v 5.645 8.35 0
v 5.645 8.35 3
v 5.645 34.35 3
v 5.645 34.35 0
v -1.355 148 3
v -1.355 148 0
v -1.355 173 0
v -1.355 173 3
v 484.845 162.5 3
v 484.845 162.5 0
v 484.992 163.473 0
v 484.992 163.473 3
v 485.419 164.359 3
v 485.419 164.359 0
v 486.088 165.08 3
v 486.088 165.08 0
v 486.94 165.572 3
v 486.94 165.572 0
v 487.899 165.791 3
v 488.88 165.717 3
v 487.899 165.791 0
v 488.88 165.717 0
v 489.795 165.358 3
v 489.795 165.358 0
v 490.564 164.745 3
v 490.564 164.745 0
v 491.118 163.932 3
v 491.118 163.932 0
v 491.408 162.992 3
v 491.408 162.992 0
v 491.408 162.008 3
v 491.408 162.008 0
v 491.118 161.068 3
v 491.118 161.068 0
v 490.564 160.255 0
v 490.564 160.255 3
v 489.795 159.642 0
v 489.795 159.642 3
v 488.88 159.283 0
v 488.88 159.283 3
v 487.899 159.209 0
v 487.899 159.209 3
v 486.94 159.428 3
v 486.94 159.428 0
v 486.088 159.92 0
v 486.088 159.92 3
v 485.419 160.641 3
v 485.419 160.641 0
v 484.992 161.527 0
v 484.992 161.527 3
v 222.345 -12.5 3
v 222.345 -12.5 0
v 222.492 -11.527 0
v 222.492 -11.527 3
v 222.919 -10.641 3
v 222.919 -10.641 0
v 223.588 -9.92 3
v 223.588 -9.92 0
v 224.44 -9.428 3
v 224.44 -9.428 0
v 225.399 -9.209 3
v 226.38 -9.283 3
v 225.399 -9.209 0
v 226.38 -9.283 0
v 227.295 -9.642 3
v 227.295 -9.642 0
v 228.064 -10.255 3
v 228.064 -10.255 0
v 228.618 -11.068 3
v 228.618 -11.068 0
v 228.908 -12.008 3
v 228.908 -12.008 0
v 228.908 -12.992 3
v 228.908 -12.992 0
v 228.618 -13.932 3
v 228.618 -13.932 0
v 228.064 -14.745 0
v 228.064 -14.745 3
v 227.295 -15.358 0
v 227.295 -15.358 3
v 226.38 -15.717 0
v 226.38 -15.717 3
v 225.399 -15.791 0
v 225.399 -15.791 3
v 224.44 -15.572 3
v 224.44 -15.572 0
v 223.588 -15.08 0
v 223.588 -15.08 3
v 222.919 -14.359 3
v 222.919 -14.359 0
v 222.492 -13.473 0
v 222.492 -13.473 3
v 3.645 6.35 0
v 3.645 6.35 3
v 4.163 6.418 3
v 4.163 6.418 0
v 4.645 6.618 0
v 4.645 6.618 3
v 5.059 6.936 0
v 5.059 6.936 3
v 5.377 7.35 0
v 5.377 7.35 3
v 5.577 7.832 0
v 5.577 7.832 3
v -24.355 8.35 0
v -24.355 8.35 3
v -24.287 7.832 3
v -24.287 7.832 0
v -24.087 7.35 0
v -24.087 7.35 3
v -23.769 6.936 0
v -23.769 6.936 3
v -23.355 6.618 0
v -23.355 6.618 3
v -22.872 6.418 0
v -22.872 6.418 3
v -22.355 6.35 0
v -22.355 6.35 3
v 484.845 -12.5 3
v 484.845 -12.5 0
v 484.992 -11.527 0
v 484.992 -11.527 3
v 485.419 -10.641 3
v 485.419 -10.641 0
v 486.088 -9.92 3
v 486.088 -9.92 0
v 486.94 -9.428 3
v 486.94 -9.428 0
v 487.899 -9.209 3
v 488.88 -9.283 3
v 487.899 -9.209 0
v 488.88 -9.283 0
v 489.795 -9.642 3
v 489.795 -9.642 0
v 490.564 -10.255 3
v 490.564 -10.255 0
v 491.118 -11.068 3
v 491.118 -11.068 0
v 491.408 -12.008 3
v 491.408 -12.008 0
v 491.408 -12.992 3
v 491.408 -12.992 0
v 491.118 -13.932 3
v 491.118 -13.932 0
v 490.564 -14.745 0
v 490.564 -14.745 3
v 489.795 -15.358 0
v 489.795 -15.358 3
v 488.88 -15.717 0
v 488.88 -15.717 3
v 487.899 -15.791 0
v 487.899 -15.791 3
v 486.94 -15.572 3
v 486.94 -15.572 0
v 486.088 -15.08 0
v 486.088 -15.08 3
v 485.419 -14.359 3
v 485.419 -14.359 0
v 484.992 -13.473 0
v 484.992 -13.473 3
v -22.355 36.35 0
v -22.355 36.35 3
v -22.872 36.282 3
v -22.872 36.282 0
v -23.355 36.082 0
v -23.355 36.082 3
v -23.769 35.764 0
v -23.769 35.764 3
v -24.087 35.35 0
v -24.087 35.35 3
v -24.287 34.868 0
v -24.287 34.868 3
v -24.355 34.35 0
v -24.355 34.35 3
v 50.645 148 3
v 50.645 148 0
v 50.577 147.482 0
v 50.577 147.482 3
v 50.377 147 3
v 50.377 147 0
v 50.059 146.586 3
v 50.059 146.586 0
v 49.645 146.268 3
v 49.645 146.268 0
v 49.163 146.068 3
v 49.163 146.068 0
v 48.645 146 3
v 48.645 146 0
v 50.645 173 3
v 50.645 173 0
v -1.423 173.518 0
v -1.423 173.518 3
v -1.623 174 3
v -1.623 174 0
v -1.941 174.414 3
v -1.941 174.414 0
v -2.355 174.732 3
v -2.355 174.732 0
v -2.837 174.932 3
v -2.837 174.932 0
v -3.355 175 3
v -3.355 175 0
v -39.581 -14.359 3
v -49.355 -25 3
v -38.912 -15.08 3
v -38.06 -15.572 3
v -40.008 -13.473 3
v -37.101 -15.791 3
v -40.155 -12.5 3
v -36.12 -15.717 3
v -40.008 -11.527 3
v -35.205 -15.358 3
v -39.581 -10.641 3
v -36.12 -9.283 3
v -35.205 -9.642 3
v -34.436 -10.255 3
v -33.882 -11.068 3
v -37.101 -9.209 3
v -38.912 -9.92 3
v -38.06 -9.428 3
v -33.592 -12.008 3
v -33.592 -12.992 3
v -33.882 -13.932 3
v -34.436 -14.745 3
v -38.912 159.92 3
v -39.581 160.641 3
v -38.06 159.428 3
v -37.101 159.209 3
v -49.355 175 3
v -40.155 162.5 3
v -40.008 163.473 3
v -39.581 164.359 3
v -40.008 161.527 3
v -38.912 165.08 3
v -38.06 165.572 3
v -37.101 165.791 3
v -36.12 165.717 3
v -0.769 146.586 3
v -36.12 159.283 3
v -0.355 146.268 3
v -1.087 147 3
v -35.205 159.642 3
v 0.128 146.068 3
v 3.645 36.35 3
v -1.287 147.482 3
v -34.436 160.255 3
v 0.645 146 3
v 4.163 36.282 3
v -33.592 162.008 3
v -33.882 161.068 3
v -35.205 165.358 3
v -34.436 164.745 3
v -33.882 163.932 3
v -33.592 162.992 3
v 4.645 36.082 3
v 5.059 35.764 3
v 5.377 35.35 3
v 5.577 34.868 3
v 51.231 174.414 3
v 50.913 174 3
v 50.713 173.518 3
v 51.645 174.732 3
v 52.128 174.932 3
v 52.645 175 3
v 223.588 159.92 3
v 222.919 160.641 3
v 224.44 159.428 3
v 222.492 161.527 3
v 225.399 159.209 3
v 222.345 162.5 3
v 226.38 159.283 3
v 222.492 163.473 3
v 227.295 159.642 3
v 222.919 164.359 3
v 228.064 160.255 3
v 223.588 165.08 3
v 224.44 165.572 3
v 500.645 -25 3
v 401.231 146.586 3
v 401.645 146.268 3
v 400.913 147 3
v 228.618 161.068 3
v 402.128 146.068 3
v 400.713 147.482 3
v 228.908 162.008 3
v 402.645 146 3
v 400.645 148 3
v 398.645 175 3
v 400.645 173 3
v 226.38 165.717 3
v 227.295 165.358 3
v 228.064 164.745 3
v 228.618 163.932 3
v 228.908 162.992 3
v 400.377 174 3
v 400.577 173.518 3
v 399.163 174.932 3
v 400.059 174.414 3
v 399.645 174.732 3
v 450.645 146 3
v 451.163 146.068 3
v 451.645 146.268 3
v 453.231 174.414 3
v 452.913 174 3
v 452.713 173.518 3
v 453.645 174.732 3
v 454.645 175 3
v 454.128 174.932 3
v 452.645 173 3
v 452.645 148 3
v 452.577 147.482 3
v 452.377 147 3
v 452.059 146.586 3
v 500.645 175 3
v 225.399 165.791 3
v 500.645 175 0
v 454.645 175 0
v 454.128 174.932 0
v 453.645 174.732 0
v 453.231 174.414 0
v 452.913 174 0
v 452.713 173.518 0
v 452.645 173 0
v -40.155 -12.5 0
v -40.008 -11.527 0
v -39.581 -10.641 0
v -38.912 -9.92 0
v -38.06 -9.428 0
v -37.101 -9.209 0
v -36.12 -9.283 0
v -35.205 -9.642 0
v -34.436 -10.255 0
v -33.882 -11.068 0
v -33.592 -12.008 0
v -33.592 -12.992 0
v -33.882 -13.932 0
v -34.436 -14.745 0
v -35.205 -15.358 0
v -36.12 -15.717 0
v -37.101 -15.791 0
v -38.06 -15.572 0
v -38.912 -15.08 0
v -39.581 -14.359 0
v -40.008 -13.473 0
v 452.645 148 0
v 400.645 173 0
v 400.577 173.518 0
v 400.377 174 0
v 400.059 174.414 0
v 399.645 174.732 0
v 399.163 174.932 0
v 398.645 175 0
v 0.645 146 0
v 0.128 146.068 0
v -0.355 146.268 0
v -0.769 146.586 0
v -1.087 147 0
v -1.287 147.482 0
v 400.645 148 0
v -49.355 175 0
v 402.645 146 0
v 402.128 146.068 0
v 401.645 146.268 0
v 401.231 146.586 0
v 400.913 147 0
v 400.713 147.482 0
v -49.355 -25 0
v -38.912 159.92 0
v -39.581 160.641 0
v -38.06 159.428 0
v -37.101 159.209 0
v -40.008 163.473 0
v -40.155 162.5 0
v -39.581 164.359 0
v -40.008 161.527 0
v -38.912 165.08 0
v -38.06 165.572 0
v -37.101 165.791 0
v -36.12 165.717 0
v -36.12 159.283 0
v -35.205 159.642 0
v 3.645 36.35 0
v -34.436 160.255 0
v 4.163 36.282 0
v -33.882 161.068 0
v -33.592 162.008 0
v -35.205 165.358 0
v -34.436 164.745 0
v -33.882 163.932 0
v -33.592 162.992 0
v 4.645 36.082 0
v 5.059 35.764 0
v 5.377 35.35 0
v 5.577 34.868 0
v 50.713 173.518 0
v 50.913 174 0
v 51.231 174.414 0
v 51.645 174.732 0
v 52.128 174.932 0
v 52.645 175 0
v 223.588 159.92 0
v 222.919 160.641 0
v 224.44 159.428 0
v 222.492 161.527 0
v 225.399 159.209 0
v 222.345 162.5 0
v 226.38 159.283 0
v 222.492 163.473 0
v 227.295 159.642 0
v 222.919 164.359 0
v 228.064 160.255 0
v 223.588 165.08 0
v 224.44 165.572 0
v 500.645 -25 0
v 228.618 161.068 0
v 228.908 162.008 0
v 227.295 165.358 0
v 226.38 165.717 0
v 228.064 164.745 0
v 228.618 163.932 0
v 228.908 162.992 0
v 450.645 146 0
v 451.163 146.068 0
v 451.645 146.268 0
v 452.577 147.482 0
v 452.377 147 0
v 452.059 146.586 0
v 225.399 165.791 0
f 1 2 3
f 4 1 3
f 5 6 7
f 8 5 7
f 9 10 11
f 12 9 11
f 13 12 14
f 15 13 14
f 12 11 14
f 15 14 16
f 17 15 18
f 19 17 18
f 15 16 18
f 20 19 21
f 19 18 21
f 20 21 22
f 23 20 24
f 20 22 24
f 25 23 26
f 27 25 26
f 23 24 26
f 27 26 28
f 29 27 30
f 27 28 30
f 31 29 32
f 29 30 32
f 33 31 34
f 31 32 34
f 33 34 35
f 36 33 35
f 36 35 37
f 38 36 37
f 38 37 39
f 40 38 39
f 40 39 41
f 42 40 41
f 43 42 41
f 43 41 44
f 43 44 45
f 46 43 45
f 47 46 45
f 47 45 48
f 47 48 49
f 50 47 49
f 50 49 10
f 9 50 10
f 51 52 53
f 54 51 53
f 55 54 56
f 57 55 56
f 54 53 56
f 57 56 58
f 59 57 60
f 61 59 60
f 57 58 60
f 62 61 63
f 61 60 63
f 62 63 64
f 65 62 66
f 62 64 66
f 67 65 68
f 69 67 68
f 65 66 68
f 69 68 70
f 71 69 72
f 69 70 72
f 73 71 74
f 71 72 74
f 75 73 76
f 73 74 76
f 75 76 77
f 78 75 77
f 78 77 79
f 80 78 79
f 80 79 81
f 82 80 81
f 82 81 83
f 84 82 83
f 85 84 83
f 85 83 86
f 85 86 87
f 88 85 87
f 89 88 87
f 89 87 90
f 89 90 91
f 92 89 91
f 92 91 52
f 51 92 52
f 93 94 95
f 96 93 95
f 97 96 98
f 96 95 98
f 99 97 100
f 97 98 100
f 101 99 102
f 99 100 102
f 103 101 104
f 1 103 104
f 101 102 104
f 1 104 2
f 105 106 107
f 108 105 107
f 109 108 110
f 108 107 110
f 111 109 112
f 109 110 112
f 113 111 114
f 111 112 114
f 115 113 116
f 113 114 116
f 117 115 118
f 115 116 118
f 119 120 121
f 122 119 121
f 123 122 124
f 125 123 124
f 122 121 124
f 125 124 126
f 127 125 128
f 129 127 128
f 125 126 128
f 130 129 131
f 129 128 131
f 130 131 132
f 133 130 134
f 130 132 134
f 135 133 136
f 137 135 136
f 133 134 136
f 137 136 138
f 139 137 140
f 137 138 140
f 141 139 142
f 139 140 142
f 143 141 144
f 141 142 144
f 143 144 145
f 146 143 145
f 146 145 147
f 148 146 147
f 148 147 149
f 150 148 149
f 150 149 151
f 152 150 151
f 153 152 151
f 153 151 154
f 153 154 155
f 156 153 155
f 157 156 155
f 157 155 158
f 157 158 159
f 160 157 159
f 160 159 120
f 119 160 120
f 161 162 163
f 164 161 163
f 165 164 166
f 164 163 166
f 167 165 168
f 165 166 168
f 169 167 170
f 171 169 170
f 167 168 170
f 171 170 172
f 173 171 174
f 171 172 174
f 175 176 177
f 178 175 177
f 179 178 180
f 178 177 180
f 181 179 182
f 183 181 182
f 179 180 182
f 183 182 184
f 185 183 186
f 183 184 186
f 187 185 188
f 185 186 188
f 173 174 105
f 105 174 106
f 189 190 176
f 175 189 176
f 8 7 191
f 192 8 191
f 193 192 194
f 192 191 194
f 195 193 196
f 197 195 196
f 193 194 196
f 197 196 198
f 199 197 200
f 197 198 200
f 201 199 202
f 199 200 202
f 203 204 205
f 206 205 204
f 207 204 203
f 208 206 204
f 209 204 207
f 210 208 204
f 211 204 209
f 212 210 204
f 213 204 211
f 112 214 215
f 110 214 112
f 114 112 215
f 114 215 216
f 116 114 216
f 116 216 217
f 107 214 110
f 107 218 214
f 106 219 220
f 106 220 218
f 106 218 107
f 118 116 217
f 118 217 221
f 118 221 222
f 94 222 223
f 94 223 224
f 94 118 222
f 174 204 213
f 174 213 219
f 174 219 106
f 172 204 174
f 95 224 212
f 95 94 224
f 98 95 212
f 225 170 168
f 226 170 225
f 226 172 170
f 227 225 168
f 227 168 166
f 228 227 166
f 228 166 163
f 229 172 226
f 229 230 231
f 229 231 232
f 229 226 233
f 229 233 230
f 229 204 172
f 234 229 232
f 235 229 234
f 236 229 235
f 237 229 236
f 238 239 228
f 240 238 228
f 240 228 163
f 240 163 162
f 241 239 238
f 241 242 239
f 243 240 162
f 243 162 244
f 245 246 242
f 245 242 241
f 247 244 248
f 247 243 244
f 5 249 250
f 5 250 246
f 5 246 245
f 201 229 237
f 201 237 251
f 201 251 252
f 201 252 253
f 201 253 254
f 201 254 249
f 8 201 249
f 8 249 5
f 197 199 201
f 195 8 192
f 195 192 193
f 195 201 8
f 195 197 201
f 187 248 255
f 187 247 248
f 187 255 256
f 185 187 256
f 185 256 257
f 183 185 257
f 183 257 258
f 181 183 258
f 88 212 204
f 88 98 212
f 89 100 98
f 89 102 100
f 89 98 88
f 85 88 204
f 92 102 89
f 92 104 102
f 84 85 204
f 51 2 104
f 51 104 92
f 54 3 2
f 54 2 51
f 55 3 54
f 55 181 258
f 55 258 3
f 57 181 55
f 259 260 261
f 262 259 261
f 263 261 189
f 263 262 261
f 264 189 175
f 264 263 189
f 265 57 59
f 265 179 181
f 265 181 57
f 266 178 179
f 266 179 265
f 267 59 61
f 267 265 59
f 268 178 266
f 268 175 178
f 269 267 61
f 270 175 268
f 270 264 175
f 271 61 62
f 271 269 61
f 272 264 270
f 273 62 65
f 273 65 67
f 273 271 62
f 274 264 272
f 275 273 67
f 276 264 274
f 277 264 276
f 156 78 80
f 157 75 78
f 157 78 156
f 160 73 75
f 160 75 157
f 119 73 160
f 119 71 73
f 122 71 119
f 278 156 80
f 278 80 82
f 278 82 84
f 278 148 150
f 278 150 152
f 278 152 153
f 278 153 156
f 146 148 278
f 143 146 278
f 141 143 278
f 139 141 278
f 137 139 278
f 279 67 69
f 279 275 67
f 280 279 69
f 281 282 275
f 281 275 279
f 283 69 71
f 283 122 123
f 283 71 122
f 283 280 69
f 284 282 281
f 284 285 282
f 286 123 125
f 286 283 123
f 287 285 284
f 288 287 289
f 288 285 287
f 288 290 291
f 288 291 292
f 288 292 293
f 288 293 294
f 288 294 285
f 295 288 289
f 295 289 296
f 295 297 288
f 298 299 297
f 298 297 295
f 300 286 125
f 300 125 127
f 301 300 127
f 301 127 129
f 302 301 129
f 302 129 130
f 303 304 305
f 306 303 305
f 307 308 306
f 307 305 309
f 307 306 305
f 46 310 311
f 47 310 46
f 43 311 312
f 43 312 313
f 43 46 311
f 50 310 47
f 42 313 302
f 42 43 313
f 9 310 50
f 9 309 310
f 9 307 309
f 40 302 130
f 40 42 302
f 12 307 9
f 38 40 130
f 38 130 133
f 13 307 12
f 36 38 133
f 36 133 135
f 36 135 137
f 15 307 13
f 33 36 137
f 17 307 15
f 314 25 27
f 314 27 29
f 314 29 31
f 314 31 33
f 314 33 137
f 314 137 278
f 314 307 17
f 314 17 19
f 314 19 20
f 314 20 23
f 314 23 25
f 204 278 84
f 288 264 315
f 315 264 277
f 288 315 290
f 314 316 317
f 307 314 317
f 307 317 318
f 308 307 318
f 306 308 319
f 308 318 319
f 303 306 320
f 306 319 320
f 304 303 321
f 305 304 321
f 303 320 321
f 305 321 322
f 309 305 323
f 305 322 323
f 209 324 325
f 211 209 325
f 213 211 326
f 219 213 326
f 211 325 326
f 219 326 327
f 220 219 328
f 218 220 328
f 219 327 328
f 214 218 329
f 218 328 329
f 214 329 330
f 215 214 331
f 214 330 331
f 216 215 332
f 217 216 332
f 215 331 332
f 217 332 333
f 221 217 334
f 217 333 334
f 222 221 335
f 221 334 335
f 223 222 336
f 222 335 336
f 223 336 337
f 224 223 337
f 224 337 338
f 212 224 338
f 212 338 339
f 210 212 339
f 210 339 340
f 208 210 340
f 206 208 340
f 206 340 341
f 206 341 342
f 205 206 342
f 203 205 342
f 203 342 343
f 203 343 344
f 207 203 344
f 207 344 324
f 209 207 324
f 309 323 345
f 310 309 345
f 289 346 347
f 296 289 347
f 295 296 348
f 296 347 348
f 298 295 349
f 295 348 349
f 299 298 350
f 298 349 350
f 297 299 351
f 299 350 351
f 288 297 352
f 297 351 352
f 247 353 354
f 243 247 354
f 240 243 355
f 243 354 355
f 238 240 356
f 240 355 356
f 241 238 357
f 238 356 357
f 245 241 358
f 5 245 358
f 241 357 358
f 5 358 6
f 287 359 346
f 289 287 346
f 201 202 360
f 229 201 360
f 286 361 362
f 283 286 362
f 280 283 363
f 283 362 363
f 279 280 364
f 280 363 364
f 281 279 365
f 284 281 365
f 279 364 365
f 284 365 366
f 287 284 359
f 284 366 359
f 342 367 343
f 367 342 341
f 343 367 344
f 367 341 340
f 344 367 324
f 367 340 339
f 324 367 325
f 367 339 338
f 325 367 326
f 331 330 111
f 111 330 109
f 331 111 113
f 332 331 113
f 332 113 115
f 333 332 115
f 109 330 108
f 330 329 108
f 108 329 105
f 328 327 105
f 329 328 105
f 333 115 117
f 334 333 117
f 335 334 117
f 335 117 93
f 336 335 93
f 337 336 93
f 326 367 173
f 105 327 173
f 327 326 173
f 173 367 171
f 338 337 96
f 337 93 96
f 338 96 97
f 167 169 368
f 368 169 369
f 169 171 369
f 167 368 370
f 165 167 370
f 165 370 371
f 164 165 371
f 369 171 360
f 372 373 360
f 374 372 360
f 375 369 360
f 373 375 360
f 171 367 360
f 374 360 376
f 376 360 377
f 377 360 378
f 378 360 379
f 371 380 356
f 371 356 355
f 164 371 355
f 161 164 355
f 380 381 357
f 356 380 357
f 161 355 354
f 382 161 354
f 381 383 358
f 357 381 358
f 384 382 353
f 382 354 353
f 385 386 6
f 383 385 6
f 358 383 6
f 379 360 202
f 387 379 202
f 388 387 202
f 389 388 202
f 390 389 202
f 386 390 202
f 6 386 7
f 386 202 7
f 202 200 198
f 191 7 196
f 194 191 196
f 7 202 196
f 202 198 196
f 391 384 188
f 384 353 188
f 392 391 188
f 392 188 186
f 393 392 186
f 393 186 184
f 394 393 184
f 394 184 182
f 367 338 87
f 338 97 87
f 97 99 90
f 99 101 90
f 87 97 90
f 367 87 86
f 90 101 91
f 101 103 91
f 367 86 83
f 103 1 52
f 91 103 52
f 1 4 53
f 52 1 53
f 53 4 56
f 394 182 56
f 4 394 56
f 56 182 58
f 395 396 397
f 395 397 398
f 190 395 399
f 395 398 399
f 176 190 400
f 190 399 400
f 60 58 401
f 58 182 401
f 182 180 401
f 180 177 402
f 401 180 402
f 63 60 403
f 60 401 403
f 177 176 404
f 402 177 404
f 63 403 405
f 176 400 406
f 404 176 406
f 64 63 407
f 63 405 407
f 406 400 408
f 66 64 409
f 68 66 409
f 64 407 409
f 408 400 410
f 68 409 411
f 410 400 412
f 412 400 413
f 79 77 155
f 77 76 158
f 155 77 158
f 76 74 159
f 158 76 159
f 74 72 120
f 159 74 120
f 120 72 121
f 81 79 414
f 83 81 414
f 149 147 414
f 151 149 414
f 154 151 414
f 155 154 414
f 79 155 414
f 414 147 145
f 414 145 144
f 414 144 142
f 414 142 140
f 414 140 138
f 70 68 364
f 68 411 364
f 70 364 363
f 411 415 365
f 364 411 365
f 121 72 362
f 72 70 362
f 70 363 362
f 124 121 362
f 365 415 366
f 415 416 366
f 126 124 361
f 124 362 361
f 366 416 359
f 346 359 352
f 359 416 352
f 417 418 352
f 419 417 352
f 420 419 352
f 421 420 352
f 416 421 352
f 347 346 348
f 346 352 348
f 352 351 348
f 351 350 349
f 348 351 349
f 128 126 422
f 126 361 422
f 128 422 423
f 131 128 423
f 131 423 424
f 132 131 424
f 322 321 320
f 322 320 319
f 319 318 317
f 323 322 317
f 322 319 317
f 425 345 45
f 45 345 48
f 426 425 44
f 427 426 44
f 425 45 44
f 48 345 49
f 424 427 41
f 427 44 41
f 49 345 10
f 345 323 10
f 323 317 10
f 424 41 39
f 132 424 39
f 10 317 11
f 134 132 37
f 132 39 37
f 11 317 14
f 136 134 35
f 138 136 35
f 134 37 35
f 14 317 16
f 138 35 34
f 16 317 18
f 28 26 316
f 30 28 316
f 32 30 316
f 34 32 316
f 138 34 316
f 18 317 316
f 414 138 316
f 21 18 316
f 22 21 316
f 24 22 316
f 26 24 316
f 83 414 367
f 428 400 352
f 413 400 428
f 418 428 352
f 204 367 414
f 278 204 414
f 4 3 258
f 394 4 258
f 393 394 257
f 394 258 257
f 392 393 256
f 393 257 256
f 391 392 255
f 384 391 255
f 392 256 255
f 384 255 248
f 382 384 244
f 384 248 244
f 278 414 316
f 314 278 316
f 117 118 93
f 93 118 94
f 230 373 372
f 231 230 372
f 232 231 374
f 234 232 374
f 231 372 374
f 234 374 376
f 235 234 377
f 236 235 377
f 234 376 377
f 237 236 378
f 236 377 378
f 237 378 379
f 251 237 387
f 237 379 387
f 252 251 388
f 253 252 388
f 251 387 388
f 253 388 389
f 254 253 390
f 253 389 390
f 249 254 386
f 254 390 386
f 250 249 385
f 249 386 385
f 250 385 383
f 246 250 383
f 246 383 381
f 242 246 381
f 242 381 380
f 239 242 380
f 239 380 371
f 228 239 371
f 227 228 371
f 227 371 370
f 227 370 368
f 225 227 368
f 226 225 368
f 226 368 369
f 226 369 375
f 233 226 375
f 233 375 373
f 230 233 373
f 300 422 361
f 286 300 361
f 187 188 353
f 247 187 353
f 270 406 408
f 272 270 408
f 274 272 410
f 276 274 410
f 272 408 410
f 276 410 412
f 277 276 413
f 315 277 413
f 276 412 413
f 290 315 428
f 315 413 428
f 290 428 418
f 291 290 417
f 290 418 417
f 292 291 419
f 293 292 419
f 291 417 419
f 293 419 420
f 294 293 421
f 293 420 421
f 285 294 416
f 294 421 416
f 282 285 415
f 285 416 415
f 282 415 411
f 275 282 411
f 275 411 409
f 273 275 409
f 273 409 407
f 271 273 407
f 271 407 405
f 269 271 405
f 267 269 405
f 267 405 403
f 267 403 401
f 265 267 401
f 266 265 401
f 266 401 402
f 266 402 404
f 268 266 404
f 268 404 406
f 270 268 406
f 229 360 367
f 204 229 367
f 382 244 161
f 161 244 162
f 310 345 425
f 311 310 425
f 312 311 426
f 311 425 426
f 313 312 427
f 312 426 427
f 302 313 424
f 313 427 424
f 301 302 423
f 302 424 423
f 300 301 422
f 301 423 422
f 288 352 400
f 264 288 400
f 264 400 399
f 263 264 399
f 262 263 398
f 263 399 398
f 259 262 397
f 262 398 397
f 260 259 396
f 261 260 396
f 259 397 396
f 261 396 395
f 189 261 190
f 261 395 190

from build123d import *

# Parameters (mm, degrees)
BOSS_EXTRUDE1_DEPTH  = 3
M6_CLEARANCE_HOLE1_D = 6.6
CUT_EXTRUDE1_DEPTH   = 531.358070854


with BuildPart() as part:
    # Sketch1 → Boss-Extrude1 (new body)
    with BuildSketch(Plane.XY):
        with BuildLine():
            Line((-49.354733049, -25), (500.645266951, -25))
            Line((500.645266951, -25), (500.645266951, 175))
            Line((500.645266951, 175), (454.645266951, 175))
            ThreePointArc((454.645266951, 175), (453.231053388, 174.414213562), (452.645266951, 173))
            Line((452.645266951, 173), (452.645266951, 148))
            ThreePointArc((452.645266951, 148), (452.059480513, 146.585786438), (450.645266951, 146))
            Line((450.645266951, 146), (402.645266951, 146))
            ThreePointArc((402.645266951, 146), (401.231053388, 146.585786438), (400.645266951, 148))
            Line((400.645266951, 148), (400.645266951, 173))
            ThreePointArc((400.645266951, 173), (400.059480513, 174.414213562), (398.645266951, 175))
            Line((398.645266951, 175), (52.645266951, 175))
            ThreePointArc((52.645266951, 175), (51.231053388, 174.414213562), (50.645266951, 173))
            Line((50.645266951, 173), (50.645266951, 148))
            ThreePointArc((50.645266951, 148), (50.059480513, 146.585786438), (48.645266951, 146))
            Line((48.645266951, 146), (0.645266951, 146))
            ThreePointArc((0.645266951, 146), (-0.768946612, 146.585786438), (-1.354733049, 148))
            Line((-1.354733049, 148), (-1.354733049, 173))
            ThreePointArc((-1.354733049, 173), (-1.940519487, 174.414213562), (-3.354733049, 175))
            Line((-3.354733049, 175), (-49.354733049, 175))
            Line((-49.354733049, 175), (-49.354733049, -25))
        make_face()
    extrude(amount=BOSS_EXTRUDE1_DEPTH)

    # M6 Clearance Hole1 (through all)
    with Locations(Plane.XY.offset(3)):
        with Locations((225.645266951, -12.5), (225.645266951, 162.5), (488.145266951, -12.5), (488.145266951, 162.5), (-36.854733049, 162.5), (-36.854733049, -12.5)):
            Hole(M6_CLEARANCE_HOLE1_D / 2)

    # Sketch4 → Cut-Extrude1 (cut, through all)
    with BuildSketch(Plane.XY.offset(3)):
        with BuildLine():
            Line((-22.354733049, 6.35), (3.645266951, 6.35))
            ThreePointArc((3.645266951, 6.35), (5.059480513, 6.935786438), (5.645266951, 8.35))
            Line((5.645266951, 8.35), (5.645266951, 34.35))
            ThreePointArc((5.645266951, 34.35), (5.059480513, 35.764213562), (3.645266951, 36.35))
            Line((3.645266951, 36.35), (-22.354733049, 36.35))
            ThreePointArc((-22.354733049, 36.35), (-23.768946612, 35.764213562), (-24.354733049, 34.35))
            Line((-24.354733049, 34.35), (-24.354733049, 8.35))
            ThreePointArc((-24.354733049, 8.35), (-23.768946612, 6.935786438), (-22.354733049, 6.35))
        make_face()
    extrude(amount=-CUT_EXTRUDE1_DEPTH, mode=Mode.SUBTRACT)


solid = part.part
